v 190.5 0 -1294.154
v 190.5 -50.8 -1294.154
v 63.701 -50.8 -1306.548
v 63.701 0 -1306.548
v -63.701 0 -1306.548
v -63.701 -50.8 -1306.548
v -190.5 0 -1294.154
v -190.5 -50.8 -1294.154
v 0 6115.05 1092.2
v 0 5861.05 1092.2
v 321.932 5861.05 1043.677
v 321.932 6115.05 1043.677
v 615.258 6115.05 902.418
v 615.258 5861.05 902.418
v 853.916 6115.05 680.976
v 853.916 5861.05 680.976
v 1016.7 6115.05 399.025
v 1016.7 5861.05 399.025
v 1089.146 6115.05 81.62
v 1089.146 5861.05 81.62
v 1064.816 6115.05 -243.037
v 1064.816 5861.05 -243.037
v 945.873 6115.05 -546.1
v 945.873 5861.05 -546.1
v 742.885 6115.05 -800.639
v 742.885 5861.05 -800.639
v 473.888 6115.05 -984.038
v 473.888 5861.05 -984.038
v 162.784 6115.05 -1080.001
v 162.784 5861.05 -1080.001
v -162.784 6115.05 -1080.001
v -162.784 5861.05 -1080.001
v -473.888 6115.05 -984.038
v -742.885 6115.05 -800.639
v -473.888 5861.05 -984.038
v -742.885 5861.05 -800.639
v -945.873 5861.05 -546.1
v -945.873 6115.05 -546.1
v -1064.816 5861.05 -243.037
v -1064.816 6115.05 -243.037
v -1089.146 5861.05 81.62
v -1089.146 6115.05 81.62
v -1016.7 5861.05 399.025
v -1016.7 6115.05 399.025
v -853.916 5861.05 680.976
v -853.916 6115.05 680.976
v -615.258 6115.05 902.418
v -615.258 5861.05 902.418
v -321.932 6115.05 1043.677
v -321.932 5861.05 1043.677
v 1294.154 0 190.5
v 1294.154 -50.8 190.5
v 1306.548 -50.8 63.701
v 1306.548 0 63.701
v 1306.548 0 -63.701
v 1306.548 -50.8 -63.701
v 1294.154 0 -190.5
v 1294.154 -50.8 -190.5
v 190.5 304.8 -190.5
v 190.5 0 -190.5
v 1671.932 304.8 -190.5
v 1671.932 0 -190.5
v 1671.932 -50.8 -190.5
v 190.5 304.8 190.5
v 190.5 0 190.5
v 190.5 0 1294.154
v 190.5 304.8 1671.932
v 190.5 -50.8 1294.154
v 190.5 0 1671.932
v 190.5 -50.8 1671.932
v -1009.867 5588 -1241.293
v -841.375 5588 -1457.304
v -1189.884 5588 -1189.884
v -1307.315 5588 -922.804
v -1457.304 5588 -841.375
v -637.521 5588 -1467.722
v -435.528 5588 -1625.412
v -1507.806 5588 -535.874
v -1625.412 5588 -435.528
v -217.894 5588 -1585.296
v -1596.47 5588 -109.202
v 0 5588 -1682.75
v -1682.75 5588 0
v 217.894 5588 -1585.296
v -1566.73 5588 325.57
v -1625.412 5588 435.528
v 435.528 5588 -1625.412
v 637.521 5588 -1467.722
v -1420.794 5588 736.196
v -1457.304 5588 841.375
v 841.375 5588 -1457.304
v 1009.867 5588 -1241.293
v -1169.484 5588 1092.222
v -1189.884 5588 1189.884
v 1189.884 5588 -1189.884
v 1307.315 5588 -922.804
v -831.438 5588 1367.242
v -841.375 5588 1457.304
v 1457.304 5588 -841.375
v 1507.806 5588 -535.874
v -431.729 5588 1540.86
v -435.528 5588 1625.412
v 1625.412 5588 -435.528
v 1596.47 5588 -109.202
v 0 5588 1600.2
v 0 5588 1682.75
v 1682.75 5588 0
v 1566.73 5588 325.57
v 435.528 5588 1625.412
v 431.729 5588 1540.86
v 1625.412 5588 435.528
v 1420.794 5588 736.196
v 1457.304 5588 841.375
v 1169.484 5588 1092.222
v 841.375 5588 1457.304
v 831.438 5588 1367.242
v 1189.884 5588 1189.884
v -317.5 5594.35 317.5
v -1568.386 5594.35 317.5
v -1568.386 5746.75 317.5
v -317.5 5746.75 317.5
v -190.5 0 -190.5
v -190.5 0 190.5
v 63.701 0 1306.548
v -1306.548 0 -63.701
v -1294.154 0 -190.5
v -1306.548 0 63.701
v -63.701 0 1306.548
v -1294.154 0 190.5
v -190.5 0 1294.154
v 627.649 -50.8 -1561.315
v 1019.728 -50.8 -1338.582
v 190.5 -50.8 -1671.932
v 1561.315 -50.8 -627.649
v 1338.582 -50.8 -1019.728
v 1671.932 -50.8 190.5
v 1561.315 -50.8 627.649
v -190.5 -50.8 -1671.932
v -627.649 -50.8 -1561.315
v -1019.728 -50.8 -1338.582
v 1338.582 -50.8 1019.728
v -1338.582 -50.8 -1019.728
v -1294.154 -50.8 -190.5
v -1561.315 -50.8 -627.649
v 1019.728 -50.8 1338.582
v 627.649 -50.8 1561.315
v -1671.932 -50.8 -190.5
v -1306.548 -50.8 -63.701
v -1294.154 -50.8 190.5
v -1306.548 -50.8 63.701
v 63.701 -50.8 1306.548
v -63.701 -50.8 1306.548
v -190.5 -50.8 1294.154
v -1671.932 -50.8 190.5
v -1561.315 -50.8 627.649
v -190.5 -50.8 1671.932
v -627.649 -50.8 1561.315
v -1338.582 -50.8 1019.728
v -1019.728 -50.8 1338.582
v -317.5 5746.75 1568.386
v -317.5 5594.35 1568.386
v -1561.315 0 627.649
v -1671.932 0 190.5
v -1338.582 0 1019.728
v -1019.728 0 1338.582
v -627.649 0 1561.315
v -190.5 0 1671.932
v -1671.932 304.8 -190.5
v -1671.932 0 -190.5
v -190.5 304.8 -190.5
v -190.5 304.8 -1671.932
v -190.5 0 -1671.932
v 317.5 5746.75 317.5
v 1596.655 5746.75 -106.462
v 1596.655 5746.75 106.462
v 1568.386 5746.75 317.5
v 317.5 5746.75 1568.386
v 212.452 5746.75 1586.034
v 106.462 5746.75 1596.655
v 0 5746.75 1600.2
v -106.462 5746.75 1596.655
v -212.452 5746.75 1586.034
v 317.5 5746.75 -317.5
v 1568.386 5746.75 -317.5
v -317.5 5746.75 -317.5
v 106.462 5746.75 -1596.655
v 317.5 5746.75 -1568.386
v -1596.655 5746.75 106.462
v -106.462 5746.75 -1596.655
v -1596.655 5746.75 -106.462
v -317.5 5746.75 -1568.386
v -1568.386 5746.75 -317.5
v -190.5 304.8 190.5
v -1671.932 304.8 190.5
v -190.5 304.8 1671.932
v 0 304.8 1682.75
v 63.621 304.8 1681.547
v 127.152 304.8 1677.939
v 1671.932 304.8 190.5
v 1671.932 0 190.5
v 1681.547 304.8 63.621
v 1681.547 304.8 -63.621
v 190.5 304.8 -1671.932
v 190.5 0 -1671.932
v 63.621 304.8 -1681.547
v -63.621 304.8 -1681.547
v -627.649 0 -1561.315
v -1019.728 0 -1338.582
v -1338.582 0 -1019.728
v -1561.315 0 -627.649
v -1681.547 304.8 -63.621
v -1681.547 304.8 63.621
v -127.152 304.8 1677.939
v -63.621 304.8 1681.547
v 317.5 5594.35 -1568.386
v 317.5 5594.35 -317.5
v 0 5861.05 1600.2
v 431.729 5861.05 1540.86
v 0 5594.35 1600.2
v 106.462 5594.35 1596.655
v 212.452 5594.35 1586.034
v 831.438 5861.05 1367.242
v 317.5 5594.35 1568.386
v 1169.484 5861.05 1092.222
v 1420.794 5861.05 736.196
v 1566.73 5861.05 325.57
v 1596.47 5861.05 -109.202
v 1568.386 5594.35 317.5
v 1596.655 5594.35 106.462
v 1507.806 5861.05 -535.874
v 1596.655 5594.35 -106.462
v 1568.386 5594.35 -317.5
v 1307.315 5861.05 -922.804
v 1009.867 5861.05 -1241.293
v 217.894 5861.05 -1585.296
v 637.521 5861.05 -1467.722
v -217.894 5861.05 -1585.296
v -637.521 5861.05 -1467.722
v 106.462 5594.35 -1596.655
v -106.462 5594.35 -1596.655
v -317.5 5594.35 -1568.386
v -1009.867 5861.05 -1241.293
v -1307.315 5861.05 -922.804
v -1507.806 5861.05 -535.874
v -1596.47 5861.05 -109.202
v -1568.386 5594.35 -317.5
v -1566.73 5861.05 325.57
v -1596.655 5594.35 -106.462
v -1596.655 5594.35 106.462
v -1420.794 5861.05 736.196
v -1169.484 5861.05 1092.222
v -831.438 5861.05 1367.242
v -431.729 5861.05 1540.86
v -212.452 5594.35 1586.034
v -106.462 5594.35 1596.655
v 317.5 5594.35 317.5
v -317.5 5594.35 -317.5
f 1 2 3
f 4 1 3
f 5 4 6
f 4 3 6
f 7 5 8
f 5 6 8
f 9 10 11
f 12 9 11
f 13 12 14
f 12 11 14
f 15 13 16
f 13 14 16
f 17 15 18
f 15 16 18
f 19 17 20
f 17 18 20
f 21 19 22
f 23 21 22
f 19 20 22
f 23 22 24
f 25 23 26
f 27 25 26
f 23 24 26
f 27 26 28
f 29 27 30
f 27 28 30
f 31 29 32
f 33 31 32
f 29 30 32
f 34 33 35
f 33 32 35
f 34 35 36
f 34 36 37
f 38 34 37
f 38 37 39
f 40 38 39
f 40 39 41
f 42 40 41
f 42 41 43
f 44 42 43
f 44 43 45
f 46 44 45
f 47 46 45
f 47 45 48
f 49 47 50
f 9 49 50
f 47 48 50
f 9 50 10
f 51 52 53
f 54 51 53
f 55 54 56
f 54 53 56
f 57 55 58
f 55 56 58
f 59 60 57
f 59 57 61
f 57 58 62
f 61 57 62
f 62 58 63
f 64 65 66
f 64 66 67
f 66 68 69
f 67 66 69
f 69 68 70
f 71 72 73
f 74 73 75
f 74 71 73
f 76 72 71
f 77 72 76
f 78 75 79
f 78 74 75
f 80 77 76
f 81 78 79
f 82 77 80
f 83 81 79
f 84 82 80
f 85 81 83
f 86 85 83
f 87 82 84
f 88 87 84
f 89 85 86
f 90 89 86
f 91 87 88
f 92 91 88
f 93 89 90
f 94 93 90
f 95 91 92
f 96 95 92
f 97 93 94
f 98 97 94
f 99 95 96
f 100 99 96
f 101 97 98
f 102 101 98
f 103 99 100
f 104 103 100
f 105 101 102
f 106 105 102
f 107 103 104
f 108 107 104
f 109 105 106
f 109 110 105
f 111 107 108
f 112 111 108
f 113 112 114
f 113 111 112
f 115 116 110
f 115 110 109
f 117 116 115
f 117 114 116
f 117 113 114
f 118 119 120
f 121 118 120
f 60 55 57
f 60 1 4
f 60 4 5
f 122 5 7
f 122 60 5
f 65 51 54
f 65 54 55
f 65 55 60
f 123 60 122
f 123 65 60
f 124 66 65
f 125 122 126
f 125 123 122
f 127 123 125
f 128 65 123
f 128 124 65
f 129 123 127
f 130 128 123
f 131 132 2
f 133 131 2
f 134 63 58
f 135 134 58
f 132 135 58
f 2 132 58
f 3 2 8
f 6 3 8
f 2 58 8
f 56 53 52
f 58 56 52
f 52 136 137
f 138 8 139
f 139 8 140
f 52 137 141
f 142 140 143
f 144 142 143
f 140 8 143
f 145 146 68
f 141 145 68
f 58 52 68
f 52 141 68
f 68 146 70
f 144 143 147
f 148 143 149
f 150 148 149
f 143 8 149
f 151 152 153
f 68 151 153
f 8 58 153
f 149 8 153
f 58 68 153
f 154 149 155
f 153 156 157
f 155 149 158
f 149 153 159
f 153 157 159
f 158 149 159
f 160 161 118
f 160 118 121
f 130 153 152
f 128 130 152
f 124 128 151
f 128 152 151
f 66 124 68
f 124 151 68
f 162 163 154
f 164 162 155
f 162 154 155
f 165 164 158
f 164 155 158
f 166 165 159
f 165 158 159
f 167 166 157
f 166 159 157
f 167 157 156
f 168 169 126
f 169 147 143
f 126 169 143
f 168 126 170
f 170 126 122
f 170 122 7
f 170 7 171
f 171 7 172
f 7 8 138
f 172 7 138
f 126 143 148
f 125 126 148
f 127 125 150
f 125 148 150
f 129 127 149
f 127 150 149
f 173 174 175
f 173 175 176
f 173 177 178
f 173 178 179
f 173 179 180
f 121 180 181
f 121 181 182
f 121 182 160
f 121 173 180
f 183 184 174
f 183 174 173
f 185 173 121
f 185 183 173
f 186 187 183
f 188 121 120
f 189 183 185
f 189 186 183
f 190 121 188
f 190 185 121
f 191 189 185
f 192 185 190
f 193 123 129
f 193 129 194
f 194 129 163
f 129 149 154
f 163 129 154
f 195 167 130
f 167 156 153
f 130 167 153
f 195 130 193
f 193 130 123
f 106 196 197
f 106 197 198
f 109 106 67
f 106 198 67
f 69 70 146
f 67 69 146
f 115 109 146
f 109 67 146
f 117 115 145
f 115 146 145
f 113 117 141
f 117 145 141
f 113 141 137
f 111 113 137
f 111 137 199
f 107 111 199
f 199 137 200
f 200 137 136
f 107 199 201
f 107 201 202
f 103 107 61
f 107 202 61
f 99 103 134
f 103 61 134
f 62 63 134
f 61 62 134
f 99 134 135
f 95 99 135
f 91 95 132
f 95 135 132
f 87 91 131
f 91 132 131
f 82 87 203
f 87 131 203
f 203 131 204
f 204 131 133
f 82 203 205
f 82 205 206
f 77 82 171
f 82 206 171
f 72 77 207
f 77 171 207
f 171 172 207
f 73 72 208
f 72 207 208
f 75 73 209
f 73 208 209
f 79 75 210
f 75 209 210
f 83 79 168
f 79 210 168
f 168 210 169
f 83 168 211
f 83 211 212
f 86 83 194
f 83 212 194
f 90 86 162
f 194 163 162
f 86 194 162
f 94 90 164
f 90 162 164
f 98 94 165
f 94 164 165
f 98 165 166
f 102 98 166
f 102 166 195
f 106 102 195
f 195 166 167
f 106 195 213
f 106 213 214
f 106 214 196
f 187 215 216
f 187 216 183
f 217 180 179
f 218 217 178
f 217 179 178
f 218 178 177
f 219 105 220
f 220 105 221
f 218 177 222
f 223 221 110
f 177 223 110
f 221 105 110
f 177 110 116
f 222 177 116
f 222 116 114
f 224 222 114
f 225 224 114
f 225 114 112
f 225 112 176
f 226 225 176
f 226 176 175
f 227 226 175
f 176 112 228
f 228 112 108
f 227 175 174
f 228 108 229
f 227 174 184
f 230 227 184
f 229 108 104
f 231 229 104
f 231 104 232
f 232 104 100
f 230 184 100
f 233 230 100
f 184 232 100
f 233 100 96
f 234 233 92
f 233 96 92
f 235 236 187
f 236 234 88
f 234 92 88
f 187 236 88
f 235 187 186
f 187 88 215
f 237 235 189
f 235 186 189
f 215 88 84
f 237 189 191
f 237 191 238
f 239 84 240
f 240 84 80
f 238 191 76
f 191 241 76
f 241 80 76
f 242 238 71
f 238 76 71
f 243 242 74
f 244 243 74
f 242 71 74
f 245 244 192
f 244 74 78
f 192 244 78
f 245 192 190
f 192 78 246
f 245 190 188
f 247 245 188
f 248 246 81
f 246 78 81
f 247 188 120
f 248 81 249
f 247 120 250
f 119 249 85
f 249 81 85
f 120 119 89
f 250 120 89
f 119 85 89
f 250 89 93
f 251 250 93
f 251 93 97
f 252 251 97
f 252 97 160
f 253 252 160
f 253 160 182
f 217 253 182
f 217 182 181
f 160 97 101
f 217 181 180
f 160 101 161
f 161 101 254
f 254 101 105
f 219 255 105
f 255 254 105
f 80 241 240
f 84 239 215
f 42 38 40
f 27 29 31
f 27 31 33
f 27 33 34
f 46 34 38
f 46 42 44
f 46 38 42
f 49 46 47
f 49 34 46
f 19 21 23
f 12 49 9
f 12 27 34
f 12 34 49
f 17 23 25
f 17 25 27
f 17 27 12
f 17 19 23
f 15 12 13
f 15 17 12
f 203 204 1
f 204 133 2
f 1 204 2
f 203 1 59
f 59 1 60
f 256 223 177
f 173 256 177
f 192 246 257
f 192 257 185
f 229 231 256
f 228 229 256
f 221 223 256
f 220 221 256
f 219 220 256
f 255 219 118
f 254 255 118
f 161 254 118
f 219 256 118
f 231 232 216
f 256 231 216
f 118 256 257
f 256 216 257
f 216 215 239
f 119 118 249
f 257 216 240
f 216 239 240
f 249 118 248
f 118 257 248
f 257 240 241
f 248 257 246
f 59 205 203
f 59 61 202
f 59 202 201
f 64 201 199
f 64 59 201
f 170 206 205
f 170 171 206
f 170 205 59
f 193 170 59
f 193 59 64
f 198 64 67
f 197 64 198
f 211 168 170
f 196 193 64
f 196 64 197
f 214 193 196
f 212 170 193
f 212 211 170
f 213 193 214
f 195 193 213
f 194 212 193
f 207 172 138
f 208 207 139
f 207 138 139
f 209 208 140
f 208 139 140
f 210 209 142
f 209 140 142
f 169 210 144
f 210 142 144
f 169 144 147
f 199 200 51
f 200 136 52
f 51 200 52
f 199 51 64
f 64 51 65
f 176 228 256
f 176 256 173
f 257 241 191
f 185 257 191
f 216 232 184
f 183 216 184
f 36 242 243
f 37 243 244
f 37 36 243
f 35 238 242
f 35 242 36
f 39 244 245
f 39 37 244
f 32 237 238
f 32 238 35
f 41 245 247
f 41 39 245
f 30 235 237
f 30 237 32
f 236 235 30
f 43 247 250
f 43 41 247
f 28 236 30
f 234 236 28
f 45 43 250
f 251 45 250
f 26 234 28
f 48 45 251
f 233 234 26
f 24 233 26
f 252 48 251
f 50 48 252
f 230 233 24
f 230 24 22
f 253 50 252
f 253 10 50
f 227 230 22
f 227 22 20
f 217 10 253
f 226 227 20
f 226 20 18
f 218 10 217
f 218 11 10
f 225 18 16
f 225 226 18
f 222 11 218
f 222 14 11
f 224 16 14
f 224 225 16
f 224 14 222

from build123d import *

# Parameters (mm, degrees)
SKETCH1_R           = 1682.75
BOSS_EXTRUDE1_DEPTH = 5588
SKETCH2_R           = 1600.2
BOSS_EXTRUDE2_DEPTH = 273.05
SKETCH3_R           = 1092.2
BOSS_EXTRUDE3_DEPTH = 254
SKETCH4_W           = 381
SKETCH4_H           = 304.8
CUT_EXTRUDE1_DEPTH  = 7180.97731995
CIRPATTERN1_COUNT   = 2
CIRPATTERN1_ANGLE   = 90
SKETCH5_W           = 635
SKETCH5_H           = 152.4
CUT_EXTRUDE2_DEPTH  = 7180.97731995
CIRPATTERN2_COUNT   = 2
CIRPATTERN2_ANGLE   = 90
BOSS_EXTRUDE4_START = 50.8
BOSS_EXTRUDE4_DEPTH = 50.8


with BuildPart() as part:
    # Sketch1 → Boss-Extrude1 (new body)
    with BuildSketch(Plane(origin=(0, 0, 0), x_dir=(1, 0, 0), z_dir=(0, 1, 0))):
        with Locations(Location((0, 0, 0), (0, 0, 270))):
            Circle(SKETCH1_R)
    extrude(amount=BOSS_EXTRUDE1_DEPTH)

    # Sketch2 → Boss-Extrude2 (add)
    with BuildSketch(Plane(origin=(0, 5588, 0), x_dir=(1, 0, 0), z_dir=(0, 1, 0))):
        with Locations(Location((0, 0, 0), (0, 0, 270))):
            Circle(SKETCH2_R)
    extrude(amount=BOSS_EXTRUDE2_DEPTH)

    # Sketch3 → Boss-Extrude3 (add)
    with BuildSketch(Plane(origin=(0, 5861.05, 0), x_dir=(1, 0, 0), z_dir=(0, 1, 0))):
        with Locations(Location((0, 0, 0), (0, 0, 270))):
            Circle(SKETCH3_R)
    extrude(amount=BOSS_EXTRUDE3_DEPTH)

    # Sketch4 → Cut-Extrude1 (cut, through all)
    with BuildSketch(Plane.ZY.offset(1682.75)):
        with Locations((0, 152.4)):
            Rectangle(SKETCH4_W, SKETCH4_H)
    cut_extrude1 = extrude(amount=-CUT_EXTRUDE1_DEPTH, mode=Mode.SUBTRACT)

    # CirPattern1: Cut-Extrude1 ×2 about axis
    cirpattern1_axis = Axis((0, 5588, 0), (0, -1, 0))
    for i in range(1, CIRPATTERN1_COUNT):
        add(cut_extrude1.rotate(cirpattern1_axis, i * CIRPATTERN1_ANGLE / (CIRPATTERN1_COUNT - 1)), mode=Mode.SUBTRACT)

    # Sketch5 → Cut-Extrude2 (cut, through all)
    with BuildSketch(Plane.ZY.offset(1682.75)):
        with Locations((0, 5670.55)):
            Rectangle(SKETCH5_W, SKETCH5_H)
    cut_extrude2 = extrude(amount=-CUT_EXTRUDE2_DEPTH, mode=Mode.SUBTRACT)

    # CirPattern2: Cut-Extrude2 ×2 about axis
    cirpattern2_axis = Axis((0, 5588, 0), (0, -1, 0))
    for i in range(1, CIRPATTERN2_COUNT):
        add(cut_extrude2.rotate(cirpattern2_axis, i * CIRPATTERN2_ANGLE / (CIRPATTERN2_COUNT - 1)), mode=Mode.SUBTRACT)

    # Sketch6 → Boss-Extrude4 (add)
    with BuildSketch(Plane.XZ.offset(BOSS_EXTRUDE4_START)):
        with BuildLine():
            Line((-190.5, 1671.932209302), (-190.5, 1294.15430301))
            ThreePointArc((-190.5, 1294.15430301), (0, 1308.1), (190.5, 1294.15430301))
            Line((190.5, 1294.15430301), (190.5, 1671.932209302))
            ThreePointArc((190.5, 1671.932209302), (1189.883936042, 1189.883936042), (1671.932209302, 190.5))
            Line((1671.932209302, 190.5), (1294.15430301, 190.5))
            ThreePointArc((1294.15430301, 190.5), (1308.1, 0), (1294.15430301, -190.5))
            Line((1294.15430301, -190.5), (1671.932209302, -190.5))
            ThreePointArc((1671.932209302, -190.5), (1189.883936042, -1189.883936042), (190.5, -1671.932209302))
            Line((190.5, -1671.932209302), (190.5, -1294.15430301))
            ThreePointArc((190.5, -1294.15430301), (0, -1308.1), (-190.5, -1294.15430301))
            Line((-190.5, -1294.15430301), (-190.5, -1671.932209302))
            ThreePointArc((-190.5, -1671.932209302), (-1189.883936042, -1189.883936042), (-1671.932209302, -190.5))
            Line((-1671.932209302, -190.5), (-1294.15430301, -190.5))
            ThreePointArc((-1294.15430301, -190.5), (-1308.1, 0), (-1294.15430301, 190.5))
            Line((-1294.15430301, 190.5), (-1671.932209302, 190.5))
            ThreePointArc((-1671.932209302, 190.5), (-1189.883936042, 1189.883936042), (-190.5, 1671.932209302))
        make_face()
    extrude(amount=-BOSS_EXTRUDE4_DEPTH)


solid = part.part
